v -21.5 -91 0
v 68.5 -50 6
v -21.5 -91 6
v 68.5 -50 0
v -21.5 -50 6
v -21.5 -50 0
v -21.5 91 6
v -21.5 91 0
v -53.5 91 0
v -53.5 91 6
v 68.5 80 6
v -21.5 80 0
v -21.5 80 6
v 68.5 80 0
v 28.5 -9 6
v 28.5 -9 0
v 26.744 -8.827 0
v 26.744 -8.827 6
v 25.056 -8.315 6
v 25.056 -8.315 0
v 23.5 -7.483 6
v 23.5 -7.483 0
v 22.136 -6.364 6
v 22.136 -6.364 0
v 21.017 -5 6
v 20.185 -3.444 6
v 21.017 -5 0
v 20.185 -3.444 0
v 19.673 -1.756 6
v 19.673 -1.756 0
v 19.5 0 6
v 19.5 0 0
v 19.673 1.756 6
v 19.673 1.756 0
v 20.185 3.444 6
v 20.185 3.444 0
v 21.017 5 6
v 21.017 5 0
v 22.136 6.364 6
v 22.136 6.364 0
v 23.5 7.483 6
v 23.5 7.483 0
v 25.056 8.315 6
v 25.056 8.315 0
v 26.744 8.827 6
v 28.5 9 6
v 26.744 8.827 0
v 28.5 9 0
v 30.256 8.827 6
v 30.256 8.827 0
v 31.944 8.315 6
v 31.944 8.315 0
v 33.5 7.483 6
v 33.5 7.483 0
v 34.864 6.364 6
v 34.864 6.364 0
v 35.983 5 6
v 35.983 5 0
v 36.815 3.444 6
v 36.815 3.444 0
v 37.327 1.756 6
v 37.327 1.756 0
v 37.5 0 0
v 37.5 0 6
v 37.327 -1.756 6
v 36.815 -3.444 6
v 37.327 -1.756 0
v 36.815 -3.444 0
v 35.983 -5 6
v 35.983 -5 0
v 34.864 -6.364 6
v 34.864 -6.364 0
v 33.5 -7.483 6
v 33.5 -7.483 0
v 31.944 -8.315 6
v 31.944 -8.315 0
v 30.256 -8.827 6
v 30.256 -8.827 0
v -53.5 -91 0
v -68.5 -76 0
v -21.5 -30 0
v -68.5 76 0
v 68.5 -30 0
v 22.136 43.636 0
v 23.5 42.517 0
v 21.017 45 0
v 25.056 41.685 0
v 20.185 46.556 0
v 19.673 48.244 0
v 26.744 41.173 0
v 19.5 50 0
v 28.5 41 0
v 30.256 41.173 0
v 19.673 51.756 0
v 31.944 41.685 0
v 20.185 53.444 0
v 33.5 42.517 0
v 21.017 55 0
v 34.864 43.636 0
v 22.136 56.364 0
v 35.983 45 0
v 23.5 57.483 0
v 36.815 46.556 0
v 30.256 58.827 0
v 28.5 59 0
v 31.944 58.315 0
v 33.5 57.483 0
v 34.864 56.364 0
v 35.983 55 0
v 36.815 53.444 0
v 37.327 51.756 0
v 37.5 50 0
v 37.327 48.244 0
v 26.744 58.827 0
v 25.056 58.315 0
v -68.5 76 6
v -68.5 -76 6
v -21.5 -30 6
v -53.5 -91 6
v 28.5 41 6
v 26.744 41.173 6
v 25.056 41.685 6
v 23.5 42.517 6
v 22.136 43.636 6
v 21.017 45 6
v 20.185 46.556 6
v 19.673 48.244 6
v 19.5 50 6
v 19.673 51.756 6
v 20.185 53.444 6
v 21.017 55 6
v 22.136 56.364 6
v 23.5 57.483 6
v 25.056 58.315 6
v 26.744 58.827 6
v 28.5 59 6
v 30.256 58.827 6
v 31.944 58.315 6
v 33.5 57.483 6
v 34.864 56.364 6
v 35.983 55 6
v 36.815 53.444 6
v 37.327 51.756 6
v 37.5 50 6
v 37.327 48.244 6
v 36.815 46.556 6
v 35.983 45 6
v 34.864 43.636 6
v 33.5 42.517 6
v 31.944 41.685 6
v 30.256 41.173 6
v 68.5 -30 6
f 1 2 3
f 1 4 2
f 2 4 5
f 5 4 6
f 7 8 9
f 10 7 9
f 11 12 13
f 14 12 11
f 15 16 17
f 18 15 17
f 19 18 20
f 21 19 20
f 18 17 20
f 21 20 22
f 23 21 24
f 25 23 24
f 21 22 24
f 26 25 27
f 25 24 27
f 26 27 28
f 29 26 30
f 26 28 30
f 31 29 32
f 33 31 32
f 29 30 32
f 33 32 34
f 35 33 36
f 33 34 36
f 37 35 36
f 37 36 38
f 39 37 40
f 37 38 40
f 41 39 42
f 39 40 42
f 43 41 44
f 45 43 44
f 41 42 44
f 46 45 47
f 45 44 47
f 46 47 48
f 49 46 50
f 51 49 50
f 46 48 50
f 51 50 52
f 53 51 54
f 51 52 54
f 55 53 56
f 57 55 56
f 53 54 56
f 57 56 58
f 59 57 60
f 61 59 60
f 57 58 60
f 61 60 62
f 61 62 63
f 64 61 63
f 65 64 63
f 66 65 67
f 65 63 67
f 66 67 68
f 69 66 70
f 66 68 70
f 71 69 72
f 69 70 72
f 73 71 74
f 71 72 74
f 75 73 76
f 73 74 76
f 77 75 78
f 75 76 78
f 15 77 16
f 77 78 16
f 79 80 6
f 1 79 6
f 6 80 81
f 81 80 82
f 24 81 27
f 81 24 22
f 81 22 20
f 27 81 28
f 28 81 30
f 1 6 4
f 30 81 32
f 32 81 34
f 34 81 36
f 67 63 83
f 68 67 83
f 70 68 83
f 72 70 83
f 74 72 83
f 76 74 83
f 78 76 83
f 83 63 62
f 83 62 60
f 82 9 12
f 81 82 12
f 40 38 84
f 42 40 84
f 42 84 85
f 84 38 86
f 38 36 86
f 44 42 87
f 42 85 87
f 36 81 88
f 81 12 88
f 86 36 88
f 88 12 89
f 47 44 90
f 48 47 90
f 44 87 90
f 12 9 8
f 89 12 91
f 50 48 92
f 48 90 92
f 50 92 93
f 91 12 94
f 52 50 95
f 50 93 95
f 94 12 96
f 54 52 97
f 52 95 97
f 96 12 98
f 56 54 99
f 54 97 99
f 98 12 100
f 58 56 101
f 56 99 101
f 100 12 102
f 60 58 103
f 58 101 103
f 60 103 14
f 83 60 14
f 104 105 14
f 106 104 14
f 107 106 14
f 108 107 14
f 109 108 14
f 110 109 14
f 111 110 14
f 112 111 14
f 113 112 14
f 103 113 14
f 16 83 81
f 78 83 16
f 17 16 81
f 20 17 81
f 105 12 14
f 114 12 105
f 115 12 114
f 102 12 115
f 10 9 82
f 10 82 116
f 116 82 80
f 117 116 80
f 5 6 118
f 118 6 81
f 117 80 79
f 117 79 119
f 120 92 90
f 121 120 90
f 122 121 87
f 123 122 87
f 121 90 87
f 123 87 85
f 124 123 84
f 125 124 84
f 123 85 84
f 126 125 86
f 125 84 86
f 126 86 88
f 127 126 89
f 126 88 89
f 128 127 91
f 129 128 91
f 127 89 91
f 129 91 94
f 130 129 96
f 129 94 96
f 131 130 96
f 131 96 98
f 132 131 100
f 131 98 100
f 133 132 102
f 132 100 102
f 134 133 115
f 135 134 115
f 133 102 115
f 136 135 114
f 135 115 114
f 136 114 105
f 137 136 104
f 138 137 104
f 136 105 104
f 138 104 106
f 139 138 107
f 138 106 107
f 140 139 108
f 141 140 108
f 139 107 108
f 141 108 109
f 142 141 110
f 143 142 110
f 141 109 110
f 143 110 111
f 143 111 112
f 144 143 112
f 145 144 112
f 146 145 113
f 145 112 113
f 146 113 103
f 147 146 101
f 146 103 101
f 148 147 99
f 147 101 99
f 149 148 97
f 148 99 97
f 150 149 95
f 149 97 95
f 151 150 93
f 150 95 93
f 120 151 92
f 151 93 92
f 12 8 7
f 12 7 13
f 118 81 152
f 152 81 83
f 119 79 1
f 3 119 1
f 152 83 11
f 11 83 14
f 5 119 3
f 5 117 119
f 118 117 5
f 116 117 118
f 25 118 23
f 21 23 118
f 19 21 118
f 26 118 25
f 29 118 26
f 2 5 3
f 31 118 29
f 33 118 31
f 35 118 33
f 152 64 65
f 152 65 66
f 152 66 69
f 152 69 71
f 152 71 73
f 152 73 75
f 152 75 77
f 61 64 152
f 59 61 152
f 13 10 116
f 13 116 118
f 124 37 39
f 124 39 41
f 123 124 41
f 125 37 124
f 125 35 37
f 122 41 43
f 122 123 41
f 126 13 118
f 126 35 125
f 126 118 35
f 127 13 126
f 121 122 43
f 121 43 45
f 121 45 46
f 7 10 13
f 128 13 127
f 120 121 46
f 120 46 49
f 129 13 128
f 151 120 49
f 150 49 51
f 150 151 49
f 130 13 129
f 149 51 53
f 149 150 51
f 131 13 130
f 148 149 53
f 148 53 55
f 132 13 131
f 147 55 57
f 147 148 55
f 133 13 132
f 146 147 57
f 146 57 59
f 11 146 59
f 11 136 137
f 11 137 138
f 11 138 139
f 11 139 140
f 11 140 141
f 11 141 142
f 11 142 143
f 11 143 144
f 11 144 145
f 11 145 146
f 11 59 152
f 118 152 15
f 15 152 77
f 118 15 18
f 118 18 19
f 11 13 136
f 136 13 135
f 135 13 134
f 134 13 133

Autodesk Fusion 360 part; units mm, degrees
sketch "スケッチ1" plane through (0, 0, 0) normal (0, 0, 1) x (1, 0, 0)
  line L0 (-21.5, 91) -> (-68.5, 91)
  line L1 (-68.5, 91) -> (-68.5, -91)
  line L2 (-68.5, -91) -> (-21.5, -91)
  line L3 (68.5, -30) -> (68.5, 80)
  line L4 (60.2198, 80) -> (-68.5, -91) construction
  line L5 (-68.5, 91) -> (45.5182, -60.4695) construction
  line L6 (-21.5, 91) -> (-21.5, 80)
  line L7 (-21.5, 80) -> (68.5, 80)
  line L8 (-68.5, -91) -> (-21.5, -91) construction
  line L9 (68.5, -50) -> (-21.5, -91)
  line L10 (68.5, -50) -> (-21.5, -50)
  line L11 (-21.5, -50) -> (-21.5, -30)
  line L12 (-21.5, -30) -> (68.5, -30)
  dimension "d2" = 182
  dimension "d5" = 47
  dimension "d7" = 90
  dimension "d8" = 20
extrude "押し出し1" add sketch "スケッチ1" along normal blind 6
chamfer "面取り1" distance 15 angle 45 2 edges at (-68.5, -91, 3) (-68.5, 91, 3)
sketch "スケッチ2" plane through (0, 0, 6) normal (0, 0, 1) x (-1, 0, 0)
  line L0 (53.5, -91) -> (68.5, -76)
  line L1 (68.5, -76) -> (68.5, 76)
  line L2 (68.5, 76) -> (53.5, 91)
  line L3 (53.5, 91) -> (21.5, 91)
  line L4 (21.5, 91) -> (-68.5, 50)
  line L5 (-68.5, 50) -> (21.5, 50)
  line L6 (21.5, 50) -> (21.5, 30)
  line L7 (21.5, 30) -> (-68.5, 30)
  line L8 (-68.5, 30) -> (-68.5, -80)
  line L9 (-68.5, -80) -> (21.5, -80)
  line L10 (21.5, -80) -> (21.5, -91)
  line L11 (21.5, -91) -> (53.5, -91)
  line L12 (-68.5, -80) -> (-28.5, -80) construction
  line L13 (-28.5, -80) -> (-28.5, -50) construction
  line L14 (-28.5, -50) -> (-68.5, -50) construction
  line L15 (-68.5, -50) -> (-68.5, -80) construction
  line L16 (-28.5, -50) -> (-28.5, 0) construction
  point P0 (-28.5, -50)
  point P1 (-28.5, 0)
  dimension "d12" = 40
  dimension "d13" = 30
  dimension "d14" = 50
hole "穴1" at (28.5, 0, 6) at (28.5, 50, 6) direction (0, 0, -1) diameter 18 end through all
equation "d5 = 15 mm + 32 mm"
